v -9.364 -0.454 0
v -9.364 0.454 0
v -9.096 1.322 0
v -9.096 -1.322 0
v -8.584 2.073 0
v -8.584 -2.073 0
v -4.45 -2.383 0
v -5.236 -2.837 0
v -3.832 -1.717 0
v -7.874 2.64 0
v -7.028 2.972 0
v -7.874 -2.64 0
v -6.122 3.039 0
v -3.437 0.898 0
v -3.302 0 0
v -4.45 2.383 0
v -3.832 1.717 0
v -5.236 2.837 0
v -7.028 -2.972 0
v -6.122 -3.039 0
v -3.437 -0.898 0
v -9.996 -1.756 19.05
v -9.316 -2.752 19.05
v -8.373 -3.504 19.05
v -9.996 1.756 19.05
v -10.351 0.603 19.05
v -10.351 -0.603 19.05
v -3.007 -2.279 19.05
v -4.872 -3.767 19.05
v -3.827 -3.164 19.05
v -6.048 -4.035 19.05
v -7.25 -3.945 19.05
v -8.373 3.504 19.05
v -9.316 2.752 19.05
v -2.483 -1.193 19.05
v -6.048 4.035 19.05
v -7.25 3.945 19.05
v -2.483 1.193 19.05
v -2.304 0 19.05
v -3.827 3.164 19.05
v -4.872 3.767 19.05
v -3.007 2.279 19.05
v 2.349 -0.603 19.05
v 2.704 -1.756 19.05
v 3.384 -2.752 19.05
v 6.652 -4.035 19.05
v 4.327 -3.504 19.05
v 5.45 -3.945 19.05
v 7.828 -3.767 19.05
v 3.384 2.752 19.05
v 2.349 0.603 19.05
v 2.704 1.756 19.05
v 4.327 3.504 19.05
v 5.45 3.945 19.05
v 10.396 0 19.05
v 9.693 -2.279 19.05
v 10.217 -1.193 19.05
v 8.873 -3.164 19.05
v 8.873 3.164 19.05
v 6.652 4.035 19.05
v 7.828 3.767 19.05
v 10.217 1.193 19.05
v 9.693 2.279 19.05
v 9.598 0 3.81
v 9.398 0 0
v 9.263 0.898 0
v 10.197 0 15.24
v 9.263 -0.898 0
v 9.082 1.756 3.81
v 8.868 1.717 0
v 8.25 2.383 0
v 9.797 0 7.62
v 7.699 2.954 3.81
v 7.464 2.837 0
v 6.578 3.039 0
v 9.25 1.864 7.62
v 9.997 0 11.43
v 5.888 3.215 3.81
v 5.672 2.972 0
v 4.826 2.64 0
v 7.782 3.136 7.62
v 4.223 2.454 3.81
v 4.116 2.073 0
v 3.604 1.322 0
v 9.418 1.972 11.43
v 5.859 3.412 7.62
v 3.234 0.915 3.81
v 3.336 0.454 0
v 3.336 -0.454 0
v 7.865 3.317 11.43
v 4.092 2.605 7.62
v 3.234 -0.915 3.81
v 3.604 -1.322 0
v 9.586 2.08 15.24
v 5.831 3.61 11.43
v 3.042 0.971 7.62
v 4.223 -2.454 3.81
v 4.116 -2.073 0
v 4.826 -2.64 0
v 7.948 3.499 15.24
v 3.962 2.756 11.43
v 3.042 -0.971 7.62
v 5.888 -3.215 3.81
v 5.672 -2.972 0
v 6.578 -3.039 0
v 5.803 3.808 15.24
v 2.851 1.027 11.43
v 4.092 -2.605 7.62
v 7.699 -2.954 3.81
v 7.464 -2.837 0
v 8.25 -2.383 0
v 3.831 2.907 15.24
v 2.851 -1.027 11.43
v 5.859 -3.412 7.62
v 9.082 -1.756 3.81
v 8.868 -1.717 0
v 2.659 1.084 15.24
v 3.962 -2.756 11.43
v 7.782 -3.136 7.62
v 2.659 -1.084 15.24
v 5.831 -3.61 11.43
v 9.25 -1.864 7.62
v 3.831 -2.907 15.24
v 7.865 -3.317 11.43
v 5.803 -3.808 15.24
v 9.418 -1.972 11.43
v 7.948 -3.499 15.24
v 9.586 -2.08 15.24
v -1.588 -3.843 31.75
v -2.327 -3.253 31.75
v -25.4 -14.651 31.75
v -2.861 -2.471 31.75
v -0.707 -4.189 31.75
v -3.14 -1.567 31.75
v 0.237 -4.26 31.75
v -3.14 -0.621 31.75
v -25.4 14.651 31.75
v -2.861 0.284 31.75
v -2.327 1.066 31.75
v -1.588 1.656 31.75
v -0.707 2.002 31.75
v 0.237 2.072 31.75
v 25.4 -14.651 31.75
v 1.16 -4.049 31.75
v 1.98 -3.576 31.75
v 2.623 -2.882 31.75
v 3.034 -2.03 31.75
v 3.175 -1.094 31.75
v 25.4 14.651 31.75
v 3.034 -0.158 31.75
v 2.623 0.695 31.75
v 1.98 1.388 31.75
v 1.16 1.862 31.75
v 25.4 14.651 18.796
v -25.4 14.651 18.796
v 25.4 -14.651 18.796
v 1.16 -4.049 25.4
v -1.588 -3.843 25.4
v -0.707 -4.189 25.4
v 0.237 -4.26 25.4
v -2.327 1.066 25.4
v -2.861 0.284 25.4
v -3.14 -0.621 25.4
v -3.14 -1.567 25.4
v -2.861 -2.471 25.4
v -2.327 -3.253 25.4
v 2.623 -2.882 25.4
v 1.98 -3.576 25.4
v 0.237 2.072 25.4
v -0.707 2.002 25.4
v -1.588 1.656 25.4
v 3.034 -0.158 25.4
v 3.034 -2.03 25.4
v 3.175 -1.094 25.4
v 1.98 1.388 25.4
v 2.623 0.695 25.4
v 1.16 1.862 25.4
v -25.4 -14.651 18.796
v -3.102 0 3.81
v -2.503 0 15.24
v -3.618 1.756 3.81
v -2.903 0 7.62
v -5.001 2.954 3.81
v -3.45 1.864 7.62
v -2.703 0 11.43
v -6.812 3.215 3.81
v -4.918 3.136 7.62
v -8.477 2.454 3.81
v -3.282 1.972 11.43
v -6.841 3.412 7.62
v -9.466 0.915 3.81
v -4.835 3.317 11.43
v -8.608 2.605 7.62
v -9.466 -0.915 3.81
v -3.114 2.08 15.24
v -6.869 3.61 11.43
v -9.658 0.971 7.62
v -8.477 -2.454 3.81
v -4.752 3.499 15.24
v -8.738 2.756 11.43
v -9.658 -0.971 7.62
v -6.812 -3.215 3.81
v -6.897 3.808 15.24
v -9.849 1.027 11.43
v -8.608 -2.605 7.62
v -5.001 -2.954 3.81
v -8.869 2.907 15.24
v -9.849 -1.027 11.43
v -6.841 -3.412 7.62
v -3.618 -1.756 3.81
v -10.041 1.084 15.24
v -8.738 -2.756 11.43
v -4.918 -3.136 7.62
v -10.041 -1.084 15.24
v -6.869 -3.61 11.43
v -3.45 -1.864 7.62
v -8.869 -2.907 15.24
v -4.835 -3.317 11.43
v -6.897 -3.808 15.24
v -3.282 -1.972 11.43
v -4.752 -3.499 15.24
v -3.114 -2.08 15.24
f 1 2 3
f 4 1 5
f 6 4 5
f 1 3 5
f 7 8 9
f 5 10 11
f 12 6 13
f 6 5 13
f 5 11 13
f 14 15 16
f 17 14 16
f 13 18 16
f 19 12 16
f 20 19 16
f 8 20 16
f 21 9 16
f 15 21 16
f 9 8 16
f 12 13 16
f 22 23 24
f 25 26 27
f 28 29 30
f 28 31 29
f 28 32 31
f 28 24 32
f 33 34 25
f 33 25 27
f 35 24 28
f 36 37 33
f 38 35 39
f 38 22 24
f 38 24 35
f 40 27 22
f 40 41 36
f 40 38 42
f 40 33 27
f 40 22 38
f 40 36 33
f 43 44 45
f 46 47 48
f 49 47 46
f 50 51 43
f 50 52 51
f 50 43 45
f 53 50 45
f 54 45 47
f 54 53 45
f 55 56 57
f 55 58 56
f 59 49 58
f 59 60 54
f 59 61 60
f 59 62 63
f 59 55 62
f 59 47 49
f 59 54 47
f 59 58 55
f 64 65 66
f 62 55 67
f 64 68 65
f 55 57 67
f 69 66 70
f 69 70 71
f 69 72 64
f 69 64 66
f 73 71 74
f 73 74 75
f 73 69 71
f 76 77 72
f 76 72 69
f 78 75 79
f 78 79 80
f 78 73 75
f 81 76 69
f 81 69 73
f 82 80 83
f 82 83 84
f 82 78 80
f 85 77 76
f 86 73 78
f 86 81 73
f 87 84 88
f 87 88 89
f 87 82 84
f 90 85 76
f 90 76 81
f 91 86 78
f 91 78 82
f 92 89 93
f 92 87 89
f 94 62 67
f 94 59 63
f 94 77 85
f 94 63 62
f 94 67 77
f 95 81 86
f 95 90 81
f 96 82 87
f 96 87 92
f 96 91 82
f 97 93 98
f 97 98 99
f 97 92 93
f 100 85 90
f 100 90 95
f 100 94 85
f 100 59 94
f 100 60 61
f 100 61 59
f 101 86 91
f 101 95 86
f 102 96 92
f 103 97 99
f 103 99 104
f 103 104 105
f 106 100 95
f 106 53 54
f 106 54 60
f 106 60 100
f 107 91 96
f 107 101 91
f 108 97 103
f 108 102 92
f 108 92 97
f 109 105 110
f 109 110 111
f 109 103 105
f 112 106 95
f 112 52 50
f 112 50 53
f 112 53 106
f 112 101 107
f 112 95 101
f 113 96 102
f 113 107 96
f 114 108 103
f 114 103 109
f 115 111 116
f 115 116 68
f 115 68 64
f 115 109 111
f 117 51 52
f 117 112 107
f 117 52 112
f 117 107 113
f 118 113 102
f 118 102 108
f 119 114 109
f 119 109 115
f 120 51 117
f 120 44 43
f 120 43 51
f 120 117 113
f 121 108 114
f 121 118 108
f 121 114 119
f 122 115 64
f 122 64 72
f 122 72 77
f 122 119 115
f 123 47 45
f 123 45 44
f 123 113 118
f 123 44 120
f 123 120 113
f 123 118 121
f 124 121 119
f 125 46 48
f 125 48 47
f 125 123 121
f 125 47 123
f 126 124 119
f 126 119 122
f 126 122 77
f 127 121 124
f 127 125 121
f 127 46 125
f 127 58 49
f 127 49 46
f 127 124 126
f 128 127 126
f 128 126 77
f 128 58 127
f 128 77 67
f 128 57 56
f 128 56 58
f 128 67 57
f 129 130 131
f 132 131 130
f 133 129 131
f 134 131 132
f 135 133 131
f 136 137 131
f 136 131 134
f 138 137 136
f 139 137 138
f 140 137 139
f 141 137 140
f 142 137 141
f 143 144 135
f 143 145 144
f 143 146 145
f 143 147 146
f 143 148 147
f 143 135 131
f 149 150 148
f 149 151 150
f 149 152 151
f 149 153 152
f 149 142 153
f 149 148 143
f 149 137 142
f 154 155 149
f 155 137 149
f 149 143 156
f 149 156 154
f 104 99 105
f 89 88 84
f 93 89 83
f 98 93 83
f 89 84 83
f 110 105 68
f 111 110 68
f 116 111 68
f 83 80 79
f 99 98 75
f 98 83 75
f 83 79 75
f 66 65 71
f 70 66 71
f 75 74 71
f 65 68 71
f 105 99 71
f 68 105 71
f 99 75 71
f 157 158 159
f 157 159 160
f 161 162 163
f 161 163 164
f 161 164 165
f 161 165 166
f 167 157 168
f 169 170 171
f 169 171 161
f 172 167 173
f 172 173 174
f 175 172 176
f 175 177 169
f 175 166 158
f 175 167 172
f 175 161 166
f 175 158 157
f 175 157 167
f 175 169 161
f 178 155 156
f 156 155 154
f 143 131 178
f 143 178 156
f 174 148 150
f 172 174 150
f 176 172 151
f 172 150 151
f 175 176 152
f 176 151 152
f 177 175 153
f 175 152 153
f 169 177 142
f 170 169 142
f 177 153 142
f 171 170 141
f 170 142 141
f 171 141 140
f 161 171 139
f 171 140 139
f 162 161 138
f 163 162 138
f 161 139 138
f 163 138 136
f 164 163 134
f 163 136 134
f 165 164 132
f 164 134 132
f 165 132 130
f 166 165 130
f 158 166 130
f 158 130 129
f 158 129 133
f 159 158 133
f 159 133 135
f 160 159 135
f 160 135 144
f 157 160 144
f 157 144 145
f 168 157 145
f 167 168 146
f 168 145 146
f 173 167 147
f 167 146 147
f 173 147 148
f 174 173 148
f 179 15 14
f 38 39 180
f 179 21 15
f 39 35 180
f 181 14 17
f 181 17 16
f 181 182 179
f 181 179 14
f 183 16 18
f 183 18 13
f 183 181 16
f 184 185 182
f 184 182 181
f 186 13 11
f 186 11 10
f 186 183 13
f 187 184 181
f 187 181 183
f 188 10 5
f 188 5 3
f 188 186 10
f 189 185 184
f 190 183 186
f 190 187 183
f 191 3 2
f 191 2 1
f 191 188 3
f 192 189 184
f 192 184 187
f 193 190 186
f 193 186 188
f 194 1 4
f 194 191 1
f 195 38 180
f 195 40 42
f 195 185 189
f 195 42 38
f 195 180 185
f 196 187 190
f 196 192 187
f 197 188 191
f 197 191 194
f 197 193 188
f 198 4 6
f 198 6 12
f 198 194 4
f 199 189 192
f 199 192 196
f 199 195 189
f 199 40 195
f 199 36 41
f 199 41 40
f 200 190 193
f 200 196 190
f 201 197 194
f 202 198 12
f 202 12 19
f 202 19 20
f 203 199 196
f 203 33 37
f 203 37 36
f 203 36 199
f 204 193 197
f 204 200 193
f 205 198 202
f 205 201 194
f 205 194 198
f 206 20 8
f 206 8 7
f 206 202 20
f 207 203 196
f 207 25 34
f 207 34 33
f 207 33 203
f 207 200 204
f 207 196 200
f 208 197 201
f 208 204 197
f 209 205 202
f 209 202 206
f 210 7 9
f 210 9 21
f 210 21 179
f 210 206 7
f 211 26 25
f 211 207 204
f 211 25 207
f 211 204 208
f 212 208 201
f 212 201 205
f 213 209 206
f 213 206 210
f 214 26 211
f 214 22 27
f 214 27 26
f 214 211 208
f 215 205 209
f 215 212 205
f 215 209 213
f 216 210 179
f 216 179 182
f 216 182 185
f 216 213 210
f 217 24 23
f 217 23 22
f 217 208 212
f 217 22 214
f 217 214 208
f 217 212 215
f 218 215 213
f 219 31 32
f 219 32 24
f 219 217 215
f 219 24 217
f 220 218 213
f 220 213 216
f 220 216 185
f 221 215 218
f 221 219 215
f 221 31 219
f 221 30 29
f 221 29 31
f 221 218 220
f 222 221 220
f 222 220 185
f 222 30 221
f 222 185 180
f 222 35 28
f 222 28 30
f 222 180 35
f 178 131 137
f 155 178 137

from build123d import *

# Parameters (mm, degrees)
F0_R          = 3.048
F1_DEPTH      = 19.05
F1_TAPER      = -3
F2_W          = 50.8
F2_H          = 29.3014320238
F3_DEPTH      = 12.7
F3_DEPTH_BACK = 0.254
F4_R          = 3.175
F5_DEPTH      = 6.35


with BuildPart() as f1:
    # F0 (on Top) → F1 (new body)
    with BuildSketch(Plane.XY):
        with Locations((6.35, 0)):
            Circle(F0_R)
    extrude(amount=F1_DEPTH, taper=F1_TAPER)


with BuildPart() as f1b:
    # F0 (on Top) → F1, piece 2 (new body)
    with BuildSketch(Plane.XY):
        with Locations((-6.35, 0)):
            Circle(F0_R)
    extrude(amount=F1_DEPTH, taper=F1_TAPER)


with BuildPart() as f3:
    # F2 (on face) → F3 (new body, two sides)
    with BuildSketch(Plane.XY.offset(19.05)) as f3_sk:
        Rectangle(F2_W, F2_H)
    extrude(amount=F3_DEPTH)
    extrude(f3_sk.sketch, amount=-F3_DEPTH_BACK)

    # F4 (on face) → F5 (cut)
    with BuildSketch(Plane.XY.offset(31.75)):
        with Locations((0, -1.0938570779)):
            Circle(F4_R)
    extrude(amount=-F5_DEPTH, mode=Mode.SUBTRACT)


solid = Compound([f1.part, f1b.part, f3.part])
